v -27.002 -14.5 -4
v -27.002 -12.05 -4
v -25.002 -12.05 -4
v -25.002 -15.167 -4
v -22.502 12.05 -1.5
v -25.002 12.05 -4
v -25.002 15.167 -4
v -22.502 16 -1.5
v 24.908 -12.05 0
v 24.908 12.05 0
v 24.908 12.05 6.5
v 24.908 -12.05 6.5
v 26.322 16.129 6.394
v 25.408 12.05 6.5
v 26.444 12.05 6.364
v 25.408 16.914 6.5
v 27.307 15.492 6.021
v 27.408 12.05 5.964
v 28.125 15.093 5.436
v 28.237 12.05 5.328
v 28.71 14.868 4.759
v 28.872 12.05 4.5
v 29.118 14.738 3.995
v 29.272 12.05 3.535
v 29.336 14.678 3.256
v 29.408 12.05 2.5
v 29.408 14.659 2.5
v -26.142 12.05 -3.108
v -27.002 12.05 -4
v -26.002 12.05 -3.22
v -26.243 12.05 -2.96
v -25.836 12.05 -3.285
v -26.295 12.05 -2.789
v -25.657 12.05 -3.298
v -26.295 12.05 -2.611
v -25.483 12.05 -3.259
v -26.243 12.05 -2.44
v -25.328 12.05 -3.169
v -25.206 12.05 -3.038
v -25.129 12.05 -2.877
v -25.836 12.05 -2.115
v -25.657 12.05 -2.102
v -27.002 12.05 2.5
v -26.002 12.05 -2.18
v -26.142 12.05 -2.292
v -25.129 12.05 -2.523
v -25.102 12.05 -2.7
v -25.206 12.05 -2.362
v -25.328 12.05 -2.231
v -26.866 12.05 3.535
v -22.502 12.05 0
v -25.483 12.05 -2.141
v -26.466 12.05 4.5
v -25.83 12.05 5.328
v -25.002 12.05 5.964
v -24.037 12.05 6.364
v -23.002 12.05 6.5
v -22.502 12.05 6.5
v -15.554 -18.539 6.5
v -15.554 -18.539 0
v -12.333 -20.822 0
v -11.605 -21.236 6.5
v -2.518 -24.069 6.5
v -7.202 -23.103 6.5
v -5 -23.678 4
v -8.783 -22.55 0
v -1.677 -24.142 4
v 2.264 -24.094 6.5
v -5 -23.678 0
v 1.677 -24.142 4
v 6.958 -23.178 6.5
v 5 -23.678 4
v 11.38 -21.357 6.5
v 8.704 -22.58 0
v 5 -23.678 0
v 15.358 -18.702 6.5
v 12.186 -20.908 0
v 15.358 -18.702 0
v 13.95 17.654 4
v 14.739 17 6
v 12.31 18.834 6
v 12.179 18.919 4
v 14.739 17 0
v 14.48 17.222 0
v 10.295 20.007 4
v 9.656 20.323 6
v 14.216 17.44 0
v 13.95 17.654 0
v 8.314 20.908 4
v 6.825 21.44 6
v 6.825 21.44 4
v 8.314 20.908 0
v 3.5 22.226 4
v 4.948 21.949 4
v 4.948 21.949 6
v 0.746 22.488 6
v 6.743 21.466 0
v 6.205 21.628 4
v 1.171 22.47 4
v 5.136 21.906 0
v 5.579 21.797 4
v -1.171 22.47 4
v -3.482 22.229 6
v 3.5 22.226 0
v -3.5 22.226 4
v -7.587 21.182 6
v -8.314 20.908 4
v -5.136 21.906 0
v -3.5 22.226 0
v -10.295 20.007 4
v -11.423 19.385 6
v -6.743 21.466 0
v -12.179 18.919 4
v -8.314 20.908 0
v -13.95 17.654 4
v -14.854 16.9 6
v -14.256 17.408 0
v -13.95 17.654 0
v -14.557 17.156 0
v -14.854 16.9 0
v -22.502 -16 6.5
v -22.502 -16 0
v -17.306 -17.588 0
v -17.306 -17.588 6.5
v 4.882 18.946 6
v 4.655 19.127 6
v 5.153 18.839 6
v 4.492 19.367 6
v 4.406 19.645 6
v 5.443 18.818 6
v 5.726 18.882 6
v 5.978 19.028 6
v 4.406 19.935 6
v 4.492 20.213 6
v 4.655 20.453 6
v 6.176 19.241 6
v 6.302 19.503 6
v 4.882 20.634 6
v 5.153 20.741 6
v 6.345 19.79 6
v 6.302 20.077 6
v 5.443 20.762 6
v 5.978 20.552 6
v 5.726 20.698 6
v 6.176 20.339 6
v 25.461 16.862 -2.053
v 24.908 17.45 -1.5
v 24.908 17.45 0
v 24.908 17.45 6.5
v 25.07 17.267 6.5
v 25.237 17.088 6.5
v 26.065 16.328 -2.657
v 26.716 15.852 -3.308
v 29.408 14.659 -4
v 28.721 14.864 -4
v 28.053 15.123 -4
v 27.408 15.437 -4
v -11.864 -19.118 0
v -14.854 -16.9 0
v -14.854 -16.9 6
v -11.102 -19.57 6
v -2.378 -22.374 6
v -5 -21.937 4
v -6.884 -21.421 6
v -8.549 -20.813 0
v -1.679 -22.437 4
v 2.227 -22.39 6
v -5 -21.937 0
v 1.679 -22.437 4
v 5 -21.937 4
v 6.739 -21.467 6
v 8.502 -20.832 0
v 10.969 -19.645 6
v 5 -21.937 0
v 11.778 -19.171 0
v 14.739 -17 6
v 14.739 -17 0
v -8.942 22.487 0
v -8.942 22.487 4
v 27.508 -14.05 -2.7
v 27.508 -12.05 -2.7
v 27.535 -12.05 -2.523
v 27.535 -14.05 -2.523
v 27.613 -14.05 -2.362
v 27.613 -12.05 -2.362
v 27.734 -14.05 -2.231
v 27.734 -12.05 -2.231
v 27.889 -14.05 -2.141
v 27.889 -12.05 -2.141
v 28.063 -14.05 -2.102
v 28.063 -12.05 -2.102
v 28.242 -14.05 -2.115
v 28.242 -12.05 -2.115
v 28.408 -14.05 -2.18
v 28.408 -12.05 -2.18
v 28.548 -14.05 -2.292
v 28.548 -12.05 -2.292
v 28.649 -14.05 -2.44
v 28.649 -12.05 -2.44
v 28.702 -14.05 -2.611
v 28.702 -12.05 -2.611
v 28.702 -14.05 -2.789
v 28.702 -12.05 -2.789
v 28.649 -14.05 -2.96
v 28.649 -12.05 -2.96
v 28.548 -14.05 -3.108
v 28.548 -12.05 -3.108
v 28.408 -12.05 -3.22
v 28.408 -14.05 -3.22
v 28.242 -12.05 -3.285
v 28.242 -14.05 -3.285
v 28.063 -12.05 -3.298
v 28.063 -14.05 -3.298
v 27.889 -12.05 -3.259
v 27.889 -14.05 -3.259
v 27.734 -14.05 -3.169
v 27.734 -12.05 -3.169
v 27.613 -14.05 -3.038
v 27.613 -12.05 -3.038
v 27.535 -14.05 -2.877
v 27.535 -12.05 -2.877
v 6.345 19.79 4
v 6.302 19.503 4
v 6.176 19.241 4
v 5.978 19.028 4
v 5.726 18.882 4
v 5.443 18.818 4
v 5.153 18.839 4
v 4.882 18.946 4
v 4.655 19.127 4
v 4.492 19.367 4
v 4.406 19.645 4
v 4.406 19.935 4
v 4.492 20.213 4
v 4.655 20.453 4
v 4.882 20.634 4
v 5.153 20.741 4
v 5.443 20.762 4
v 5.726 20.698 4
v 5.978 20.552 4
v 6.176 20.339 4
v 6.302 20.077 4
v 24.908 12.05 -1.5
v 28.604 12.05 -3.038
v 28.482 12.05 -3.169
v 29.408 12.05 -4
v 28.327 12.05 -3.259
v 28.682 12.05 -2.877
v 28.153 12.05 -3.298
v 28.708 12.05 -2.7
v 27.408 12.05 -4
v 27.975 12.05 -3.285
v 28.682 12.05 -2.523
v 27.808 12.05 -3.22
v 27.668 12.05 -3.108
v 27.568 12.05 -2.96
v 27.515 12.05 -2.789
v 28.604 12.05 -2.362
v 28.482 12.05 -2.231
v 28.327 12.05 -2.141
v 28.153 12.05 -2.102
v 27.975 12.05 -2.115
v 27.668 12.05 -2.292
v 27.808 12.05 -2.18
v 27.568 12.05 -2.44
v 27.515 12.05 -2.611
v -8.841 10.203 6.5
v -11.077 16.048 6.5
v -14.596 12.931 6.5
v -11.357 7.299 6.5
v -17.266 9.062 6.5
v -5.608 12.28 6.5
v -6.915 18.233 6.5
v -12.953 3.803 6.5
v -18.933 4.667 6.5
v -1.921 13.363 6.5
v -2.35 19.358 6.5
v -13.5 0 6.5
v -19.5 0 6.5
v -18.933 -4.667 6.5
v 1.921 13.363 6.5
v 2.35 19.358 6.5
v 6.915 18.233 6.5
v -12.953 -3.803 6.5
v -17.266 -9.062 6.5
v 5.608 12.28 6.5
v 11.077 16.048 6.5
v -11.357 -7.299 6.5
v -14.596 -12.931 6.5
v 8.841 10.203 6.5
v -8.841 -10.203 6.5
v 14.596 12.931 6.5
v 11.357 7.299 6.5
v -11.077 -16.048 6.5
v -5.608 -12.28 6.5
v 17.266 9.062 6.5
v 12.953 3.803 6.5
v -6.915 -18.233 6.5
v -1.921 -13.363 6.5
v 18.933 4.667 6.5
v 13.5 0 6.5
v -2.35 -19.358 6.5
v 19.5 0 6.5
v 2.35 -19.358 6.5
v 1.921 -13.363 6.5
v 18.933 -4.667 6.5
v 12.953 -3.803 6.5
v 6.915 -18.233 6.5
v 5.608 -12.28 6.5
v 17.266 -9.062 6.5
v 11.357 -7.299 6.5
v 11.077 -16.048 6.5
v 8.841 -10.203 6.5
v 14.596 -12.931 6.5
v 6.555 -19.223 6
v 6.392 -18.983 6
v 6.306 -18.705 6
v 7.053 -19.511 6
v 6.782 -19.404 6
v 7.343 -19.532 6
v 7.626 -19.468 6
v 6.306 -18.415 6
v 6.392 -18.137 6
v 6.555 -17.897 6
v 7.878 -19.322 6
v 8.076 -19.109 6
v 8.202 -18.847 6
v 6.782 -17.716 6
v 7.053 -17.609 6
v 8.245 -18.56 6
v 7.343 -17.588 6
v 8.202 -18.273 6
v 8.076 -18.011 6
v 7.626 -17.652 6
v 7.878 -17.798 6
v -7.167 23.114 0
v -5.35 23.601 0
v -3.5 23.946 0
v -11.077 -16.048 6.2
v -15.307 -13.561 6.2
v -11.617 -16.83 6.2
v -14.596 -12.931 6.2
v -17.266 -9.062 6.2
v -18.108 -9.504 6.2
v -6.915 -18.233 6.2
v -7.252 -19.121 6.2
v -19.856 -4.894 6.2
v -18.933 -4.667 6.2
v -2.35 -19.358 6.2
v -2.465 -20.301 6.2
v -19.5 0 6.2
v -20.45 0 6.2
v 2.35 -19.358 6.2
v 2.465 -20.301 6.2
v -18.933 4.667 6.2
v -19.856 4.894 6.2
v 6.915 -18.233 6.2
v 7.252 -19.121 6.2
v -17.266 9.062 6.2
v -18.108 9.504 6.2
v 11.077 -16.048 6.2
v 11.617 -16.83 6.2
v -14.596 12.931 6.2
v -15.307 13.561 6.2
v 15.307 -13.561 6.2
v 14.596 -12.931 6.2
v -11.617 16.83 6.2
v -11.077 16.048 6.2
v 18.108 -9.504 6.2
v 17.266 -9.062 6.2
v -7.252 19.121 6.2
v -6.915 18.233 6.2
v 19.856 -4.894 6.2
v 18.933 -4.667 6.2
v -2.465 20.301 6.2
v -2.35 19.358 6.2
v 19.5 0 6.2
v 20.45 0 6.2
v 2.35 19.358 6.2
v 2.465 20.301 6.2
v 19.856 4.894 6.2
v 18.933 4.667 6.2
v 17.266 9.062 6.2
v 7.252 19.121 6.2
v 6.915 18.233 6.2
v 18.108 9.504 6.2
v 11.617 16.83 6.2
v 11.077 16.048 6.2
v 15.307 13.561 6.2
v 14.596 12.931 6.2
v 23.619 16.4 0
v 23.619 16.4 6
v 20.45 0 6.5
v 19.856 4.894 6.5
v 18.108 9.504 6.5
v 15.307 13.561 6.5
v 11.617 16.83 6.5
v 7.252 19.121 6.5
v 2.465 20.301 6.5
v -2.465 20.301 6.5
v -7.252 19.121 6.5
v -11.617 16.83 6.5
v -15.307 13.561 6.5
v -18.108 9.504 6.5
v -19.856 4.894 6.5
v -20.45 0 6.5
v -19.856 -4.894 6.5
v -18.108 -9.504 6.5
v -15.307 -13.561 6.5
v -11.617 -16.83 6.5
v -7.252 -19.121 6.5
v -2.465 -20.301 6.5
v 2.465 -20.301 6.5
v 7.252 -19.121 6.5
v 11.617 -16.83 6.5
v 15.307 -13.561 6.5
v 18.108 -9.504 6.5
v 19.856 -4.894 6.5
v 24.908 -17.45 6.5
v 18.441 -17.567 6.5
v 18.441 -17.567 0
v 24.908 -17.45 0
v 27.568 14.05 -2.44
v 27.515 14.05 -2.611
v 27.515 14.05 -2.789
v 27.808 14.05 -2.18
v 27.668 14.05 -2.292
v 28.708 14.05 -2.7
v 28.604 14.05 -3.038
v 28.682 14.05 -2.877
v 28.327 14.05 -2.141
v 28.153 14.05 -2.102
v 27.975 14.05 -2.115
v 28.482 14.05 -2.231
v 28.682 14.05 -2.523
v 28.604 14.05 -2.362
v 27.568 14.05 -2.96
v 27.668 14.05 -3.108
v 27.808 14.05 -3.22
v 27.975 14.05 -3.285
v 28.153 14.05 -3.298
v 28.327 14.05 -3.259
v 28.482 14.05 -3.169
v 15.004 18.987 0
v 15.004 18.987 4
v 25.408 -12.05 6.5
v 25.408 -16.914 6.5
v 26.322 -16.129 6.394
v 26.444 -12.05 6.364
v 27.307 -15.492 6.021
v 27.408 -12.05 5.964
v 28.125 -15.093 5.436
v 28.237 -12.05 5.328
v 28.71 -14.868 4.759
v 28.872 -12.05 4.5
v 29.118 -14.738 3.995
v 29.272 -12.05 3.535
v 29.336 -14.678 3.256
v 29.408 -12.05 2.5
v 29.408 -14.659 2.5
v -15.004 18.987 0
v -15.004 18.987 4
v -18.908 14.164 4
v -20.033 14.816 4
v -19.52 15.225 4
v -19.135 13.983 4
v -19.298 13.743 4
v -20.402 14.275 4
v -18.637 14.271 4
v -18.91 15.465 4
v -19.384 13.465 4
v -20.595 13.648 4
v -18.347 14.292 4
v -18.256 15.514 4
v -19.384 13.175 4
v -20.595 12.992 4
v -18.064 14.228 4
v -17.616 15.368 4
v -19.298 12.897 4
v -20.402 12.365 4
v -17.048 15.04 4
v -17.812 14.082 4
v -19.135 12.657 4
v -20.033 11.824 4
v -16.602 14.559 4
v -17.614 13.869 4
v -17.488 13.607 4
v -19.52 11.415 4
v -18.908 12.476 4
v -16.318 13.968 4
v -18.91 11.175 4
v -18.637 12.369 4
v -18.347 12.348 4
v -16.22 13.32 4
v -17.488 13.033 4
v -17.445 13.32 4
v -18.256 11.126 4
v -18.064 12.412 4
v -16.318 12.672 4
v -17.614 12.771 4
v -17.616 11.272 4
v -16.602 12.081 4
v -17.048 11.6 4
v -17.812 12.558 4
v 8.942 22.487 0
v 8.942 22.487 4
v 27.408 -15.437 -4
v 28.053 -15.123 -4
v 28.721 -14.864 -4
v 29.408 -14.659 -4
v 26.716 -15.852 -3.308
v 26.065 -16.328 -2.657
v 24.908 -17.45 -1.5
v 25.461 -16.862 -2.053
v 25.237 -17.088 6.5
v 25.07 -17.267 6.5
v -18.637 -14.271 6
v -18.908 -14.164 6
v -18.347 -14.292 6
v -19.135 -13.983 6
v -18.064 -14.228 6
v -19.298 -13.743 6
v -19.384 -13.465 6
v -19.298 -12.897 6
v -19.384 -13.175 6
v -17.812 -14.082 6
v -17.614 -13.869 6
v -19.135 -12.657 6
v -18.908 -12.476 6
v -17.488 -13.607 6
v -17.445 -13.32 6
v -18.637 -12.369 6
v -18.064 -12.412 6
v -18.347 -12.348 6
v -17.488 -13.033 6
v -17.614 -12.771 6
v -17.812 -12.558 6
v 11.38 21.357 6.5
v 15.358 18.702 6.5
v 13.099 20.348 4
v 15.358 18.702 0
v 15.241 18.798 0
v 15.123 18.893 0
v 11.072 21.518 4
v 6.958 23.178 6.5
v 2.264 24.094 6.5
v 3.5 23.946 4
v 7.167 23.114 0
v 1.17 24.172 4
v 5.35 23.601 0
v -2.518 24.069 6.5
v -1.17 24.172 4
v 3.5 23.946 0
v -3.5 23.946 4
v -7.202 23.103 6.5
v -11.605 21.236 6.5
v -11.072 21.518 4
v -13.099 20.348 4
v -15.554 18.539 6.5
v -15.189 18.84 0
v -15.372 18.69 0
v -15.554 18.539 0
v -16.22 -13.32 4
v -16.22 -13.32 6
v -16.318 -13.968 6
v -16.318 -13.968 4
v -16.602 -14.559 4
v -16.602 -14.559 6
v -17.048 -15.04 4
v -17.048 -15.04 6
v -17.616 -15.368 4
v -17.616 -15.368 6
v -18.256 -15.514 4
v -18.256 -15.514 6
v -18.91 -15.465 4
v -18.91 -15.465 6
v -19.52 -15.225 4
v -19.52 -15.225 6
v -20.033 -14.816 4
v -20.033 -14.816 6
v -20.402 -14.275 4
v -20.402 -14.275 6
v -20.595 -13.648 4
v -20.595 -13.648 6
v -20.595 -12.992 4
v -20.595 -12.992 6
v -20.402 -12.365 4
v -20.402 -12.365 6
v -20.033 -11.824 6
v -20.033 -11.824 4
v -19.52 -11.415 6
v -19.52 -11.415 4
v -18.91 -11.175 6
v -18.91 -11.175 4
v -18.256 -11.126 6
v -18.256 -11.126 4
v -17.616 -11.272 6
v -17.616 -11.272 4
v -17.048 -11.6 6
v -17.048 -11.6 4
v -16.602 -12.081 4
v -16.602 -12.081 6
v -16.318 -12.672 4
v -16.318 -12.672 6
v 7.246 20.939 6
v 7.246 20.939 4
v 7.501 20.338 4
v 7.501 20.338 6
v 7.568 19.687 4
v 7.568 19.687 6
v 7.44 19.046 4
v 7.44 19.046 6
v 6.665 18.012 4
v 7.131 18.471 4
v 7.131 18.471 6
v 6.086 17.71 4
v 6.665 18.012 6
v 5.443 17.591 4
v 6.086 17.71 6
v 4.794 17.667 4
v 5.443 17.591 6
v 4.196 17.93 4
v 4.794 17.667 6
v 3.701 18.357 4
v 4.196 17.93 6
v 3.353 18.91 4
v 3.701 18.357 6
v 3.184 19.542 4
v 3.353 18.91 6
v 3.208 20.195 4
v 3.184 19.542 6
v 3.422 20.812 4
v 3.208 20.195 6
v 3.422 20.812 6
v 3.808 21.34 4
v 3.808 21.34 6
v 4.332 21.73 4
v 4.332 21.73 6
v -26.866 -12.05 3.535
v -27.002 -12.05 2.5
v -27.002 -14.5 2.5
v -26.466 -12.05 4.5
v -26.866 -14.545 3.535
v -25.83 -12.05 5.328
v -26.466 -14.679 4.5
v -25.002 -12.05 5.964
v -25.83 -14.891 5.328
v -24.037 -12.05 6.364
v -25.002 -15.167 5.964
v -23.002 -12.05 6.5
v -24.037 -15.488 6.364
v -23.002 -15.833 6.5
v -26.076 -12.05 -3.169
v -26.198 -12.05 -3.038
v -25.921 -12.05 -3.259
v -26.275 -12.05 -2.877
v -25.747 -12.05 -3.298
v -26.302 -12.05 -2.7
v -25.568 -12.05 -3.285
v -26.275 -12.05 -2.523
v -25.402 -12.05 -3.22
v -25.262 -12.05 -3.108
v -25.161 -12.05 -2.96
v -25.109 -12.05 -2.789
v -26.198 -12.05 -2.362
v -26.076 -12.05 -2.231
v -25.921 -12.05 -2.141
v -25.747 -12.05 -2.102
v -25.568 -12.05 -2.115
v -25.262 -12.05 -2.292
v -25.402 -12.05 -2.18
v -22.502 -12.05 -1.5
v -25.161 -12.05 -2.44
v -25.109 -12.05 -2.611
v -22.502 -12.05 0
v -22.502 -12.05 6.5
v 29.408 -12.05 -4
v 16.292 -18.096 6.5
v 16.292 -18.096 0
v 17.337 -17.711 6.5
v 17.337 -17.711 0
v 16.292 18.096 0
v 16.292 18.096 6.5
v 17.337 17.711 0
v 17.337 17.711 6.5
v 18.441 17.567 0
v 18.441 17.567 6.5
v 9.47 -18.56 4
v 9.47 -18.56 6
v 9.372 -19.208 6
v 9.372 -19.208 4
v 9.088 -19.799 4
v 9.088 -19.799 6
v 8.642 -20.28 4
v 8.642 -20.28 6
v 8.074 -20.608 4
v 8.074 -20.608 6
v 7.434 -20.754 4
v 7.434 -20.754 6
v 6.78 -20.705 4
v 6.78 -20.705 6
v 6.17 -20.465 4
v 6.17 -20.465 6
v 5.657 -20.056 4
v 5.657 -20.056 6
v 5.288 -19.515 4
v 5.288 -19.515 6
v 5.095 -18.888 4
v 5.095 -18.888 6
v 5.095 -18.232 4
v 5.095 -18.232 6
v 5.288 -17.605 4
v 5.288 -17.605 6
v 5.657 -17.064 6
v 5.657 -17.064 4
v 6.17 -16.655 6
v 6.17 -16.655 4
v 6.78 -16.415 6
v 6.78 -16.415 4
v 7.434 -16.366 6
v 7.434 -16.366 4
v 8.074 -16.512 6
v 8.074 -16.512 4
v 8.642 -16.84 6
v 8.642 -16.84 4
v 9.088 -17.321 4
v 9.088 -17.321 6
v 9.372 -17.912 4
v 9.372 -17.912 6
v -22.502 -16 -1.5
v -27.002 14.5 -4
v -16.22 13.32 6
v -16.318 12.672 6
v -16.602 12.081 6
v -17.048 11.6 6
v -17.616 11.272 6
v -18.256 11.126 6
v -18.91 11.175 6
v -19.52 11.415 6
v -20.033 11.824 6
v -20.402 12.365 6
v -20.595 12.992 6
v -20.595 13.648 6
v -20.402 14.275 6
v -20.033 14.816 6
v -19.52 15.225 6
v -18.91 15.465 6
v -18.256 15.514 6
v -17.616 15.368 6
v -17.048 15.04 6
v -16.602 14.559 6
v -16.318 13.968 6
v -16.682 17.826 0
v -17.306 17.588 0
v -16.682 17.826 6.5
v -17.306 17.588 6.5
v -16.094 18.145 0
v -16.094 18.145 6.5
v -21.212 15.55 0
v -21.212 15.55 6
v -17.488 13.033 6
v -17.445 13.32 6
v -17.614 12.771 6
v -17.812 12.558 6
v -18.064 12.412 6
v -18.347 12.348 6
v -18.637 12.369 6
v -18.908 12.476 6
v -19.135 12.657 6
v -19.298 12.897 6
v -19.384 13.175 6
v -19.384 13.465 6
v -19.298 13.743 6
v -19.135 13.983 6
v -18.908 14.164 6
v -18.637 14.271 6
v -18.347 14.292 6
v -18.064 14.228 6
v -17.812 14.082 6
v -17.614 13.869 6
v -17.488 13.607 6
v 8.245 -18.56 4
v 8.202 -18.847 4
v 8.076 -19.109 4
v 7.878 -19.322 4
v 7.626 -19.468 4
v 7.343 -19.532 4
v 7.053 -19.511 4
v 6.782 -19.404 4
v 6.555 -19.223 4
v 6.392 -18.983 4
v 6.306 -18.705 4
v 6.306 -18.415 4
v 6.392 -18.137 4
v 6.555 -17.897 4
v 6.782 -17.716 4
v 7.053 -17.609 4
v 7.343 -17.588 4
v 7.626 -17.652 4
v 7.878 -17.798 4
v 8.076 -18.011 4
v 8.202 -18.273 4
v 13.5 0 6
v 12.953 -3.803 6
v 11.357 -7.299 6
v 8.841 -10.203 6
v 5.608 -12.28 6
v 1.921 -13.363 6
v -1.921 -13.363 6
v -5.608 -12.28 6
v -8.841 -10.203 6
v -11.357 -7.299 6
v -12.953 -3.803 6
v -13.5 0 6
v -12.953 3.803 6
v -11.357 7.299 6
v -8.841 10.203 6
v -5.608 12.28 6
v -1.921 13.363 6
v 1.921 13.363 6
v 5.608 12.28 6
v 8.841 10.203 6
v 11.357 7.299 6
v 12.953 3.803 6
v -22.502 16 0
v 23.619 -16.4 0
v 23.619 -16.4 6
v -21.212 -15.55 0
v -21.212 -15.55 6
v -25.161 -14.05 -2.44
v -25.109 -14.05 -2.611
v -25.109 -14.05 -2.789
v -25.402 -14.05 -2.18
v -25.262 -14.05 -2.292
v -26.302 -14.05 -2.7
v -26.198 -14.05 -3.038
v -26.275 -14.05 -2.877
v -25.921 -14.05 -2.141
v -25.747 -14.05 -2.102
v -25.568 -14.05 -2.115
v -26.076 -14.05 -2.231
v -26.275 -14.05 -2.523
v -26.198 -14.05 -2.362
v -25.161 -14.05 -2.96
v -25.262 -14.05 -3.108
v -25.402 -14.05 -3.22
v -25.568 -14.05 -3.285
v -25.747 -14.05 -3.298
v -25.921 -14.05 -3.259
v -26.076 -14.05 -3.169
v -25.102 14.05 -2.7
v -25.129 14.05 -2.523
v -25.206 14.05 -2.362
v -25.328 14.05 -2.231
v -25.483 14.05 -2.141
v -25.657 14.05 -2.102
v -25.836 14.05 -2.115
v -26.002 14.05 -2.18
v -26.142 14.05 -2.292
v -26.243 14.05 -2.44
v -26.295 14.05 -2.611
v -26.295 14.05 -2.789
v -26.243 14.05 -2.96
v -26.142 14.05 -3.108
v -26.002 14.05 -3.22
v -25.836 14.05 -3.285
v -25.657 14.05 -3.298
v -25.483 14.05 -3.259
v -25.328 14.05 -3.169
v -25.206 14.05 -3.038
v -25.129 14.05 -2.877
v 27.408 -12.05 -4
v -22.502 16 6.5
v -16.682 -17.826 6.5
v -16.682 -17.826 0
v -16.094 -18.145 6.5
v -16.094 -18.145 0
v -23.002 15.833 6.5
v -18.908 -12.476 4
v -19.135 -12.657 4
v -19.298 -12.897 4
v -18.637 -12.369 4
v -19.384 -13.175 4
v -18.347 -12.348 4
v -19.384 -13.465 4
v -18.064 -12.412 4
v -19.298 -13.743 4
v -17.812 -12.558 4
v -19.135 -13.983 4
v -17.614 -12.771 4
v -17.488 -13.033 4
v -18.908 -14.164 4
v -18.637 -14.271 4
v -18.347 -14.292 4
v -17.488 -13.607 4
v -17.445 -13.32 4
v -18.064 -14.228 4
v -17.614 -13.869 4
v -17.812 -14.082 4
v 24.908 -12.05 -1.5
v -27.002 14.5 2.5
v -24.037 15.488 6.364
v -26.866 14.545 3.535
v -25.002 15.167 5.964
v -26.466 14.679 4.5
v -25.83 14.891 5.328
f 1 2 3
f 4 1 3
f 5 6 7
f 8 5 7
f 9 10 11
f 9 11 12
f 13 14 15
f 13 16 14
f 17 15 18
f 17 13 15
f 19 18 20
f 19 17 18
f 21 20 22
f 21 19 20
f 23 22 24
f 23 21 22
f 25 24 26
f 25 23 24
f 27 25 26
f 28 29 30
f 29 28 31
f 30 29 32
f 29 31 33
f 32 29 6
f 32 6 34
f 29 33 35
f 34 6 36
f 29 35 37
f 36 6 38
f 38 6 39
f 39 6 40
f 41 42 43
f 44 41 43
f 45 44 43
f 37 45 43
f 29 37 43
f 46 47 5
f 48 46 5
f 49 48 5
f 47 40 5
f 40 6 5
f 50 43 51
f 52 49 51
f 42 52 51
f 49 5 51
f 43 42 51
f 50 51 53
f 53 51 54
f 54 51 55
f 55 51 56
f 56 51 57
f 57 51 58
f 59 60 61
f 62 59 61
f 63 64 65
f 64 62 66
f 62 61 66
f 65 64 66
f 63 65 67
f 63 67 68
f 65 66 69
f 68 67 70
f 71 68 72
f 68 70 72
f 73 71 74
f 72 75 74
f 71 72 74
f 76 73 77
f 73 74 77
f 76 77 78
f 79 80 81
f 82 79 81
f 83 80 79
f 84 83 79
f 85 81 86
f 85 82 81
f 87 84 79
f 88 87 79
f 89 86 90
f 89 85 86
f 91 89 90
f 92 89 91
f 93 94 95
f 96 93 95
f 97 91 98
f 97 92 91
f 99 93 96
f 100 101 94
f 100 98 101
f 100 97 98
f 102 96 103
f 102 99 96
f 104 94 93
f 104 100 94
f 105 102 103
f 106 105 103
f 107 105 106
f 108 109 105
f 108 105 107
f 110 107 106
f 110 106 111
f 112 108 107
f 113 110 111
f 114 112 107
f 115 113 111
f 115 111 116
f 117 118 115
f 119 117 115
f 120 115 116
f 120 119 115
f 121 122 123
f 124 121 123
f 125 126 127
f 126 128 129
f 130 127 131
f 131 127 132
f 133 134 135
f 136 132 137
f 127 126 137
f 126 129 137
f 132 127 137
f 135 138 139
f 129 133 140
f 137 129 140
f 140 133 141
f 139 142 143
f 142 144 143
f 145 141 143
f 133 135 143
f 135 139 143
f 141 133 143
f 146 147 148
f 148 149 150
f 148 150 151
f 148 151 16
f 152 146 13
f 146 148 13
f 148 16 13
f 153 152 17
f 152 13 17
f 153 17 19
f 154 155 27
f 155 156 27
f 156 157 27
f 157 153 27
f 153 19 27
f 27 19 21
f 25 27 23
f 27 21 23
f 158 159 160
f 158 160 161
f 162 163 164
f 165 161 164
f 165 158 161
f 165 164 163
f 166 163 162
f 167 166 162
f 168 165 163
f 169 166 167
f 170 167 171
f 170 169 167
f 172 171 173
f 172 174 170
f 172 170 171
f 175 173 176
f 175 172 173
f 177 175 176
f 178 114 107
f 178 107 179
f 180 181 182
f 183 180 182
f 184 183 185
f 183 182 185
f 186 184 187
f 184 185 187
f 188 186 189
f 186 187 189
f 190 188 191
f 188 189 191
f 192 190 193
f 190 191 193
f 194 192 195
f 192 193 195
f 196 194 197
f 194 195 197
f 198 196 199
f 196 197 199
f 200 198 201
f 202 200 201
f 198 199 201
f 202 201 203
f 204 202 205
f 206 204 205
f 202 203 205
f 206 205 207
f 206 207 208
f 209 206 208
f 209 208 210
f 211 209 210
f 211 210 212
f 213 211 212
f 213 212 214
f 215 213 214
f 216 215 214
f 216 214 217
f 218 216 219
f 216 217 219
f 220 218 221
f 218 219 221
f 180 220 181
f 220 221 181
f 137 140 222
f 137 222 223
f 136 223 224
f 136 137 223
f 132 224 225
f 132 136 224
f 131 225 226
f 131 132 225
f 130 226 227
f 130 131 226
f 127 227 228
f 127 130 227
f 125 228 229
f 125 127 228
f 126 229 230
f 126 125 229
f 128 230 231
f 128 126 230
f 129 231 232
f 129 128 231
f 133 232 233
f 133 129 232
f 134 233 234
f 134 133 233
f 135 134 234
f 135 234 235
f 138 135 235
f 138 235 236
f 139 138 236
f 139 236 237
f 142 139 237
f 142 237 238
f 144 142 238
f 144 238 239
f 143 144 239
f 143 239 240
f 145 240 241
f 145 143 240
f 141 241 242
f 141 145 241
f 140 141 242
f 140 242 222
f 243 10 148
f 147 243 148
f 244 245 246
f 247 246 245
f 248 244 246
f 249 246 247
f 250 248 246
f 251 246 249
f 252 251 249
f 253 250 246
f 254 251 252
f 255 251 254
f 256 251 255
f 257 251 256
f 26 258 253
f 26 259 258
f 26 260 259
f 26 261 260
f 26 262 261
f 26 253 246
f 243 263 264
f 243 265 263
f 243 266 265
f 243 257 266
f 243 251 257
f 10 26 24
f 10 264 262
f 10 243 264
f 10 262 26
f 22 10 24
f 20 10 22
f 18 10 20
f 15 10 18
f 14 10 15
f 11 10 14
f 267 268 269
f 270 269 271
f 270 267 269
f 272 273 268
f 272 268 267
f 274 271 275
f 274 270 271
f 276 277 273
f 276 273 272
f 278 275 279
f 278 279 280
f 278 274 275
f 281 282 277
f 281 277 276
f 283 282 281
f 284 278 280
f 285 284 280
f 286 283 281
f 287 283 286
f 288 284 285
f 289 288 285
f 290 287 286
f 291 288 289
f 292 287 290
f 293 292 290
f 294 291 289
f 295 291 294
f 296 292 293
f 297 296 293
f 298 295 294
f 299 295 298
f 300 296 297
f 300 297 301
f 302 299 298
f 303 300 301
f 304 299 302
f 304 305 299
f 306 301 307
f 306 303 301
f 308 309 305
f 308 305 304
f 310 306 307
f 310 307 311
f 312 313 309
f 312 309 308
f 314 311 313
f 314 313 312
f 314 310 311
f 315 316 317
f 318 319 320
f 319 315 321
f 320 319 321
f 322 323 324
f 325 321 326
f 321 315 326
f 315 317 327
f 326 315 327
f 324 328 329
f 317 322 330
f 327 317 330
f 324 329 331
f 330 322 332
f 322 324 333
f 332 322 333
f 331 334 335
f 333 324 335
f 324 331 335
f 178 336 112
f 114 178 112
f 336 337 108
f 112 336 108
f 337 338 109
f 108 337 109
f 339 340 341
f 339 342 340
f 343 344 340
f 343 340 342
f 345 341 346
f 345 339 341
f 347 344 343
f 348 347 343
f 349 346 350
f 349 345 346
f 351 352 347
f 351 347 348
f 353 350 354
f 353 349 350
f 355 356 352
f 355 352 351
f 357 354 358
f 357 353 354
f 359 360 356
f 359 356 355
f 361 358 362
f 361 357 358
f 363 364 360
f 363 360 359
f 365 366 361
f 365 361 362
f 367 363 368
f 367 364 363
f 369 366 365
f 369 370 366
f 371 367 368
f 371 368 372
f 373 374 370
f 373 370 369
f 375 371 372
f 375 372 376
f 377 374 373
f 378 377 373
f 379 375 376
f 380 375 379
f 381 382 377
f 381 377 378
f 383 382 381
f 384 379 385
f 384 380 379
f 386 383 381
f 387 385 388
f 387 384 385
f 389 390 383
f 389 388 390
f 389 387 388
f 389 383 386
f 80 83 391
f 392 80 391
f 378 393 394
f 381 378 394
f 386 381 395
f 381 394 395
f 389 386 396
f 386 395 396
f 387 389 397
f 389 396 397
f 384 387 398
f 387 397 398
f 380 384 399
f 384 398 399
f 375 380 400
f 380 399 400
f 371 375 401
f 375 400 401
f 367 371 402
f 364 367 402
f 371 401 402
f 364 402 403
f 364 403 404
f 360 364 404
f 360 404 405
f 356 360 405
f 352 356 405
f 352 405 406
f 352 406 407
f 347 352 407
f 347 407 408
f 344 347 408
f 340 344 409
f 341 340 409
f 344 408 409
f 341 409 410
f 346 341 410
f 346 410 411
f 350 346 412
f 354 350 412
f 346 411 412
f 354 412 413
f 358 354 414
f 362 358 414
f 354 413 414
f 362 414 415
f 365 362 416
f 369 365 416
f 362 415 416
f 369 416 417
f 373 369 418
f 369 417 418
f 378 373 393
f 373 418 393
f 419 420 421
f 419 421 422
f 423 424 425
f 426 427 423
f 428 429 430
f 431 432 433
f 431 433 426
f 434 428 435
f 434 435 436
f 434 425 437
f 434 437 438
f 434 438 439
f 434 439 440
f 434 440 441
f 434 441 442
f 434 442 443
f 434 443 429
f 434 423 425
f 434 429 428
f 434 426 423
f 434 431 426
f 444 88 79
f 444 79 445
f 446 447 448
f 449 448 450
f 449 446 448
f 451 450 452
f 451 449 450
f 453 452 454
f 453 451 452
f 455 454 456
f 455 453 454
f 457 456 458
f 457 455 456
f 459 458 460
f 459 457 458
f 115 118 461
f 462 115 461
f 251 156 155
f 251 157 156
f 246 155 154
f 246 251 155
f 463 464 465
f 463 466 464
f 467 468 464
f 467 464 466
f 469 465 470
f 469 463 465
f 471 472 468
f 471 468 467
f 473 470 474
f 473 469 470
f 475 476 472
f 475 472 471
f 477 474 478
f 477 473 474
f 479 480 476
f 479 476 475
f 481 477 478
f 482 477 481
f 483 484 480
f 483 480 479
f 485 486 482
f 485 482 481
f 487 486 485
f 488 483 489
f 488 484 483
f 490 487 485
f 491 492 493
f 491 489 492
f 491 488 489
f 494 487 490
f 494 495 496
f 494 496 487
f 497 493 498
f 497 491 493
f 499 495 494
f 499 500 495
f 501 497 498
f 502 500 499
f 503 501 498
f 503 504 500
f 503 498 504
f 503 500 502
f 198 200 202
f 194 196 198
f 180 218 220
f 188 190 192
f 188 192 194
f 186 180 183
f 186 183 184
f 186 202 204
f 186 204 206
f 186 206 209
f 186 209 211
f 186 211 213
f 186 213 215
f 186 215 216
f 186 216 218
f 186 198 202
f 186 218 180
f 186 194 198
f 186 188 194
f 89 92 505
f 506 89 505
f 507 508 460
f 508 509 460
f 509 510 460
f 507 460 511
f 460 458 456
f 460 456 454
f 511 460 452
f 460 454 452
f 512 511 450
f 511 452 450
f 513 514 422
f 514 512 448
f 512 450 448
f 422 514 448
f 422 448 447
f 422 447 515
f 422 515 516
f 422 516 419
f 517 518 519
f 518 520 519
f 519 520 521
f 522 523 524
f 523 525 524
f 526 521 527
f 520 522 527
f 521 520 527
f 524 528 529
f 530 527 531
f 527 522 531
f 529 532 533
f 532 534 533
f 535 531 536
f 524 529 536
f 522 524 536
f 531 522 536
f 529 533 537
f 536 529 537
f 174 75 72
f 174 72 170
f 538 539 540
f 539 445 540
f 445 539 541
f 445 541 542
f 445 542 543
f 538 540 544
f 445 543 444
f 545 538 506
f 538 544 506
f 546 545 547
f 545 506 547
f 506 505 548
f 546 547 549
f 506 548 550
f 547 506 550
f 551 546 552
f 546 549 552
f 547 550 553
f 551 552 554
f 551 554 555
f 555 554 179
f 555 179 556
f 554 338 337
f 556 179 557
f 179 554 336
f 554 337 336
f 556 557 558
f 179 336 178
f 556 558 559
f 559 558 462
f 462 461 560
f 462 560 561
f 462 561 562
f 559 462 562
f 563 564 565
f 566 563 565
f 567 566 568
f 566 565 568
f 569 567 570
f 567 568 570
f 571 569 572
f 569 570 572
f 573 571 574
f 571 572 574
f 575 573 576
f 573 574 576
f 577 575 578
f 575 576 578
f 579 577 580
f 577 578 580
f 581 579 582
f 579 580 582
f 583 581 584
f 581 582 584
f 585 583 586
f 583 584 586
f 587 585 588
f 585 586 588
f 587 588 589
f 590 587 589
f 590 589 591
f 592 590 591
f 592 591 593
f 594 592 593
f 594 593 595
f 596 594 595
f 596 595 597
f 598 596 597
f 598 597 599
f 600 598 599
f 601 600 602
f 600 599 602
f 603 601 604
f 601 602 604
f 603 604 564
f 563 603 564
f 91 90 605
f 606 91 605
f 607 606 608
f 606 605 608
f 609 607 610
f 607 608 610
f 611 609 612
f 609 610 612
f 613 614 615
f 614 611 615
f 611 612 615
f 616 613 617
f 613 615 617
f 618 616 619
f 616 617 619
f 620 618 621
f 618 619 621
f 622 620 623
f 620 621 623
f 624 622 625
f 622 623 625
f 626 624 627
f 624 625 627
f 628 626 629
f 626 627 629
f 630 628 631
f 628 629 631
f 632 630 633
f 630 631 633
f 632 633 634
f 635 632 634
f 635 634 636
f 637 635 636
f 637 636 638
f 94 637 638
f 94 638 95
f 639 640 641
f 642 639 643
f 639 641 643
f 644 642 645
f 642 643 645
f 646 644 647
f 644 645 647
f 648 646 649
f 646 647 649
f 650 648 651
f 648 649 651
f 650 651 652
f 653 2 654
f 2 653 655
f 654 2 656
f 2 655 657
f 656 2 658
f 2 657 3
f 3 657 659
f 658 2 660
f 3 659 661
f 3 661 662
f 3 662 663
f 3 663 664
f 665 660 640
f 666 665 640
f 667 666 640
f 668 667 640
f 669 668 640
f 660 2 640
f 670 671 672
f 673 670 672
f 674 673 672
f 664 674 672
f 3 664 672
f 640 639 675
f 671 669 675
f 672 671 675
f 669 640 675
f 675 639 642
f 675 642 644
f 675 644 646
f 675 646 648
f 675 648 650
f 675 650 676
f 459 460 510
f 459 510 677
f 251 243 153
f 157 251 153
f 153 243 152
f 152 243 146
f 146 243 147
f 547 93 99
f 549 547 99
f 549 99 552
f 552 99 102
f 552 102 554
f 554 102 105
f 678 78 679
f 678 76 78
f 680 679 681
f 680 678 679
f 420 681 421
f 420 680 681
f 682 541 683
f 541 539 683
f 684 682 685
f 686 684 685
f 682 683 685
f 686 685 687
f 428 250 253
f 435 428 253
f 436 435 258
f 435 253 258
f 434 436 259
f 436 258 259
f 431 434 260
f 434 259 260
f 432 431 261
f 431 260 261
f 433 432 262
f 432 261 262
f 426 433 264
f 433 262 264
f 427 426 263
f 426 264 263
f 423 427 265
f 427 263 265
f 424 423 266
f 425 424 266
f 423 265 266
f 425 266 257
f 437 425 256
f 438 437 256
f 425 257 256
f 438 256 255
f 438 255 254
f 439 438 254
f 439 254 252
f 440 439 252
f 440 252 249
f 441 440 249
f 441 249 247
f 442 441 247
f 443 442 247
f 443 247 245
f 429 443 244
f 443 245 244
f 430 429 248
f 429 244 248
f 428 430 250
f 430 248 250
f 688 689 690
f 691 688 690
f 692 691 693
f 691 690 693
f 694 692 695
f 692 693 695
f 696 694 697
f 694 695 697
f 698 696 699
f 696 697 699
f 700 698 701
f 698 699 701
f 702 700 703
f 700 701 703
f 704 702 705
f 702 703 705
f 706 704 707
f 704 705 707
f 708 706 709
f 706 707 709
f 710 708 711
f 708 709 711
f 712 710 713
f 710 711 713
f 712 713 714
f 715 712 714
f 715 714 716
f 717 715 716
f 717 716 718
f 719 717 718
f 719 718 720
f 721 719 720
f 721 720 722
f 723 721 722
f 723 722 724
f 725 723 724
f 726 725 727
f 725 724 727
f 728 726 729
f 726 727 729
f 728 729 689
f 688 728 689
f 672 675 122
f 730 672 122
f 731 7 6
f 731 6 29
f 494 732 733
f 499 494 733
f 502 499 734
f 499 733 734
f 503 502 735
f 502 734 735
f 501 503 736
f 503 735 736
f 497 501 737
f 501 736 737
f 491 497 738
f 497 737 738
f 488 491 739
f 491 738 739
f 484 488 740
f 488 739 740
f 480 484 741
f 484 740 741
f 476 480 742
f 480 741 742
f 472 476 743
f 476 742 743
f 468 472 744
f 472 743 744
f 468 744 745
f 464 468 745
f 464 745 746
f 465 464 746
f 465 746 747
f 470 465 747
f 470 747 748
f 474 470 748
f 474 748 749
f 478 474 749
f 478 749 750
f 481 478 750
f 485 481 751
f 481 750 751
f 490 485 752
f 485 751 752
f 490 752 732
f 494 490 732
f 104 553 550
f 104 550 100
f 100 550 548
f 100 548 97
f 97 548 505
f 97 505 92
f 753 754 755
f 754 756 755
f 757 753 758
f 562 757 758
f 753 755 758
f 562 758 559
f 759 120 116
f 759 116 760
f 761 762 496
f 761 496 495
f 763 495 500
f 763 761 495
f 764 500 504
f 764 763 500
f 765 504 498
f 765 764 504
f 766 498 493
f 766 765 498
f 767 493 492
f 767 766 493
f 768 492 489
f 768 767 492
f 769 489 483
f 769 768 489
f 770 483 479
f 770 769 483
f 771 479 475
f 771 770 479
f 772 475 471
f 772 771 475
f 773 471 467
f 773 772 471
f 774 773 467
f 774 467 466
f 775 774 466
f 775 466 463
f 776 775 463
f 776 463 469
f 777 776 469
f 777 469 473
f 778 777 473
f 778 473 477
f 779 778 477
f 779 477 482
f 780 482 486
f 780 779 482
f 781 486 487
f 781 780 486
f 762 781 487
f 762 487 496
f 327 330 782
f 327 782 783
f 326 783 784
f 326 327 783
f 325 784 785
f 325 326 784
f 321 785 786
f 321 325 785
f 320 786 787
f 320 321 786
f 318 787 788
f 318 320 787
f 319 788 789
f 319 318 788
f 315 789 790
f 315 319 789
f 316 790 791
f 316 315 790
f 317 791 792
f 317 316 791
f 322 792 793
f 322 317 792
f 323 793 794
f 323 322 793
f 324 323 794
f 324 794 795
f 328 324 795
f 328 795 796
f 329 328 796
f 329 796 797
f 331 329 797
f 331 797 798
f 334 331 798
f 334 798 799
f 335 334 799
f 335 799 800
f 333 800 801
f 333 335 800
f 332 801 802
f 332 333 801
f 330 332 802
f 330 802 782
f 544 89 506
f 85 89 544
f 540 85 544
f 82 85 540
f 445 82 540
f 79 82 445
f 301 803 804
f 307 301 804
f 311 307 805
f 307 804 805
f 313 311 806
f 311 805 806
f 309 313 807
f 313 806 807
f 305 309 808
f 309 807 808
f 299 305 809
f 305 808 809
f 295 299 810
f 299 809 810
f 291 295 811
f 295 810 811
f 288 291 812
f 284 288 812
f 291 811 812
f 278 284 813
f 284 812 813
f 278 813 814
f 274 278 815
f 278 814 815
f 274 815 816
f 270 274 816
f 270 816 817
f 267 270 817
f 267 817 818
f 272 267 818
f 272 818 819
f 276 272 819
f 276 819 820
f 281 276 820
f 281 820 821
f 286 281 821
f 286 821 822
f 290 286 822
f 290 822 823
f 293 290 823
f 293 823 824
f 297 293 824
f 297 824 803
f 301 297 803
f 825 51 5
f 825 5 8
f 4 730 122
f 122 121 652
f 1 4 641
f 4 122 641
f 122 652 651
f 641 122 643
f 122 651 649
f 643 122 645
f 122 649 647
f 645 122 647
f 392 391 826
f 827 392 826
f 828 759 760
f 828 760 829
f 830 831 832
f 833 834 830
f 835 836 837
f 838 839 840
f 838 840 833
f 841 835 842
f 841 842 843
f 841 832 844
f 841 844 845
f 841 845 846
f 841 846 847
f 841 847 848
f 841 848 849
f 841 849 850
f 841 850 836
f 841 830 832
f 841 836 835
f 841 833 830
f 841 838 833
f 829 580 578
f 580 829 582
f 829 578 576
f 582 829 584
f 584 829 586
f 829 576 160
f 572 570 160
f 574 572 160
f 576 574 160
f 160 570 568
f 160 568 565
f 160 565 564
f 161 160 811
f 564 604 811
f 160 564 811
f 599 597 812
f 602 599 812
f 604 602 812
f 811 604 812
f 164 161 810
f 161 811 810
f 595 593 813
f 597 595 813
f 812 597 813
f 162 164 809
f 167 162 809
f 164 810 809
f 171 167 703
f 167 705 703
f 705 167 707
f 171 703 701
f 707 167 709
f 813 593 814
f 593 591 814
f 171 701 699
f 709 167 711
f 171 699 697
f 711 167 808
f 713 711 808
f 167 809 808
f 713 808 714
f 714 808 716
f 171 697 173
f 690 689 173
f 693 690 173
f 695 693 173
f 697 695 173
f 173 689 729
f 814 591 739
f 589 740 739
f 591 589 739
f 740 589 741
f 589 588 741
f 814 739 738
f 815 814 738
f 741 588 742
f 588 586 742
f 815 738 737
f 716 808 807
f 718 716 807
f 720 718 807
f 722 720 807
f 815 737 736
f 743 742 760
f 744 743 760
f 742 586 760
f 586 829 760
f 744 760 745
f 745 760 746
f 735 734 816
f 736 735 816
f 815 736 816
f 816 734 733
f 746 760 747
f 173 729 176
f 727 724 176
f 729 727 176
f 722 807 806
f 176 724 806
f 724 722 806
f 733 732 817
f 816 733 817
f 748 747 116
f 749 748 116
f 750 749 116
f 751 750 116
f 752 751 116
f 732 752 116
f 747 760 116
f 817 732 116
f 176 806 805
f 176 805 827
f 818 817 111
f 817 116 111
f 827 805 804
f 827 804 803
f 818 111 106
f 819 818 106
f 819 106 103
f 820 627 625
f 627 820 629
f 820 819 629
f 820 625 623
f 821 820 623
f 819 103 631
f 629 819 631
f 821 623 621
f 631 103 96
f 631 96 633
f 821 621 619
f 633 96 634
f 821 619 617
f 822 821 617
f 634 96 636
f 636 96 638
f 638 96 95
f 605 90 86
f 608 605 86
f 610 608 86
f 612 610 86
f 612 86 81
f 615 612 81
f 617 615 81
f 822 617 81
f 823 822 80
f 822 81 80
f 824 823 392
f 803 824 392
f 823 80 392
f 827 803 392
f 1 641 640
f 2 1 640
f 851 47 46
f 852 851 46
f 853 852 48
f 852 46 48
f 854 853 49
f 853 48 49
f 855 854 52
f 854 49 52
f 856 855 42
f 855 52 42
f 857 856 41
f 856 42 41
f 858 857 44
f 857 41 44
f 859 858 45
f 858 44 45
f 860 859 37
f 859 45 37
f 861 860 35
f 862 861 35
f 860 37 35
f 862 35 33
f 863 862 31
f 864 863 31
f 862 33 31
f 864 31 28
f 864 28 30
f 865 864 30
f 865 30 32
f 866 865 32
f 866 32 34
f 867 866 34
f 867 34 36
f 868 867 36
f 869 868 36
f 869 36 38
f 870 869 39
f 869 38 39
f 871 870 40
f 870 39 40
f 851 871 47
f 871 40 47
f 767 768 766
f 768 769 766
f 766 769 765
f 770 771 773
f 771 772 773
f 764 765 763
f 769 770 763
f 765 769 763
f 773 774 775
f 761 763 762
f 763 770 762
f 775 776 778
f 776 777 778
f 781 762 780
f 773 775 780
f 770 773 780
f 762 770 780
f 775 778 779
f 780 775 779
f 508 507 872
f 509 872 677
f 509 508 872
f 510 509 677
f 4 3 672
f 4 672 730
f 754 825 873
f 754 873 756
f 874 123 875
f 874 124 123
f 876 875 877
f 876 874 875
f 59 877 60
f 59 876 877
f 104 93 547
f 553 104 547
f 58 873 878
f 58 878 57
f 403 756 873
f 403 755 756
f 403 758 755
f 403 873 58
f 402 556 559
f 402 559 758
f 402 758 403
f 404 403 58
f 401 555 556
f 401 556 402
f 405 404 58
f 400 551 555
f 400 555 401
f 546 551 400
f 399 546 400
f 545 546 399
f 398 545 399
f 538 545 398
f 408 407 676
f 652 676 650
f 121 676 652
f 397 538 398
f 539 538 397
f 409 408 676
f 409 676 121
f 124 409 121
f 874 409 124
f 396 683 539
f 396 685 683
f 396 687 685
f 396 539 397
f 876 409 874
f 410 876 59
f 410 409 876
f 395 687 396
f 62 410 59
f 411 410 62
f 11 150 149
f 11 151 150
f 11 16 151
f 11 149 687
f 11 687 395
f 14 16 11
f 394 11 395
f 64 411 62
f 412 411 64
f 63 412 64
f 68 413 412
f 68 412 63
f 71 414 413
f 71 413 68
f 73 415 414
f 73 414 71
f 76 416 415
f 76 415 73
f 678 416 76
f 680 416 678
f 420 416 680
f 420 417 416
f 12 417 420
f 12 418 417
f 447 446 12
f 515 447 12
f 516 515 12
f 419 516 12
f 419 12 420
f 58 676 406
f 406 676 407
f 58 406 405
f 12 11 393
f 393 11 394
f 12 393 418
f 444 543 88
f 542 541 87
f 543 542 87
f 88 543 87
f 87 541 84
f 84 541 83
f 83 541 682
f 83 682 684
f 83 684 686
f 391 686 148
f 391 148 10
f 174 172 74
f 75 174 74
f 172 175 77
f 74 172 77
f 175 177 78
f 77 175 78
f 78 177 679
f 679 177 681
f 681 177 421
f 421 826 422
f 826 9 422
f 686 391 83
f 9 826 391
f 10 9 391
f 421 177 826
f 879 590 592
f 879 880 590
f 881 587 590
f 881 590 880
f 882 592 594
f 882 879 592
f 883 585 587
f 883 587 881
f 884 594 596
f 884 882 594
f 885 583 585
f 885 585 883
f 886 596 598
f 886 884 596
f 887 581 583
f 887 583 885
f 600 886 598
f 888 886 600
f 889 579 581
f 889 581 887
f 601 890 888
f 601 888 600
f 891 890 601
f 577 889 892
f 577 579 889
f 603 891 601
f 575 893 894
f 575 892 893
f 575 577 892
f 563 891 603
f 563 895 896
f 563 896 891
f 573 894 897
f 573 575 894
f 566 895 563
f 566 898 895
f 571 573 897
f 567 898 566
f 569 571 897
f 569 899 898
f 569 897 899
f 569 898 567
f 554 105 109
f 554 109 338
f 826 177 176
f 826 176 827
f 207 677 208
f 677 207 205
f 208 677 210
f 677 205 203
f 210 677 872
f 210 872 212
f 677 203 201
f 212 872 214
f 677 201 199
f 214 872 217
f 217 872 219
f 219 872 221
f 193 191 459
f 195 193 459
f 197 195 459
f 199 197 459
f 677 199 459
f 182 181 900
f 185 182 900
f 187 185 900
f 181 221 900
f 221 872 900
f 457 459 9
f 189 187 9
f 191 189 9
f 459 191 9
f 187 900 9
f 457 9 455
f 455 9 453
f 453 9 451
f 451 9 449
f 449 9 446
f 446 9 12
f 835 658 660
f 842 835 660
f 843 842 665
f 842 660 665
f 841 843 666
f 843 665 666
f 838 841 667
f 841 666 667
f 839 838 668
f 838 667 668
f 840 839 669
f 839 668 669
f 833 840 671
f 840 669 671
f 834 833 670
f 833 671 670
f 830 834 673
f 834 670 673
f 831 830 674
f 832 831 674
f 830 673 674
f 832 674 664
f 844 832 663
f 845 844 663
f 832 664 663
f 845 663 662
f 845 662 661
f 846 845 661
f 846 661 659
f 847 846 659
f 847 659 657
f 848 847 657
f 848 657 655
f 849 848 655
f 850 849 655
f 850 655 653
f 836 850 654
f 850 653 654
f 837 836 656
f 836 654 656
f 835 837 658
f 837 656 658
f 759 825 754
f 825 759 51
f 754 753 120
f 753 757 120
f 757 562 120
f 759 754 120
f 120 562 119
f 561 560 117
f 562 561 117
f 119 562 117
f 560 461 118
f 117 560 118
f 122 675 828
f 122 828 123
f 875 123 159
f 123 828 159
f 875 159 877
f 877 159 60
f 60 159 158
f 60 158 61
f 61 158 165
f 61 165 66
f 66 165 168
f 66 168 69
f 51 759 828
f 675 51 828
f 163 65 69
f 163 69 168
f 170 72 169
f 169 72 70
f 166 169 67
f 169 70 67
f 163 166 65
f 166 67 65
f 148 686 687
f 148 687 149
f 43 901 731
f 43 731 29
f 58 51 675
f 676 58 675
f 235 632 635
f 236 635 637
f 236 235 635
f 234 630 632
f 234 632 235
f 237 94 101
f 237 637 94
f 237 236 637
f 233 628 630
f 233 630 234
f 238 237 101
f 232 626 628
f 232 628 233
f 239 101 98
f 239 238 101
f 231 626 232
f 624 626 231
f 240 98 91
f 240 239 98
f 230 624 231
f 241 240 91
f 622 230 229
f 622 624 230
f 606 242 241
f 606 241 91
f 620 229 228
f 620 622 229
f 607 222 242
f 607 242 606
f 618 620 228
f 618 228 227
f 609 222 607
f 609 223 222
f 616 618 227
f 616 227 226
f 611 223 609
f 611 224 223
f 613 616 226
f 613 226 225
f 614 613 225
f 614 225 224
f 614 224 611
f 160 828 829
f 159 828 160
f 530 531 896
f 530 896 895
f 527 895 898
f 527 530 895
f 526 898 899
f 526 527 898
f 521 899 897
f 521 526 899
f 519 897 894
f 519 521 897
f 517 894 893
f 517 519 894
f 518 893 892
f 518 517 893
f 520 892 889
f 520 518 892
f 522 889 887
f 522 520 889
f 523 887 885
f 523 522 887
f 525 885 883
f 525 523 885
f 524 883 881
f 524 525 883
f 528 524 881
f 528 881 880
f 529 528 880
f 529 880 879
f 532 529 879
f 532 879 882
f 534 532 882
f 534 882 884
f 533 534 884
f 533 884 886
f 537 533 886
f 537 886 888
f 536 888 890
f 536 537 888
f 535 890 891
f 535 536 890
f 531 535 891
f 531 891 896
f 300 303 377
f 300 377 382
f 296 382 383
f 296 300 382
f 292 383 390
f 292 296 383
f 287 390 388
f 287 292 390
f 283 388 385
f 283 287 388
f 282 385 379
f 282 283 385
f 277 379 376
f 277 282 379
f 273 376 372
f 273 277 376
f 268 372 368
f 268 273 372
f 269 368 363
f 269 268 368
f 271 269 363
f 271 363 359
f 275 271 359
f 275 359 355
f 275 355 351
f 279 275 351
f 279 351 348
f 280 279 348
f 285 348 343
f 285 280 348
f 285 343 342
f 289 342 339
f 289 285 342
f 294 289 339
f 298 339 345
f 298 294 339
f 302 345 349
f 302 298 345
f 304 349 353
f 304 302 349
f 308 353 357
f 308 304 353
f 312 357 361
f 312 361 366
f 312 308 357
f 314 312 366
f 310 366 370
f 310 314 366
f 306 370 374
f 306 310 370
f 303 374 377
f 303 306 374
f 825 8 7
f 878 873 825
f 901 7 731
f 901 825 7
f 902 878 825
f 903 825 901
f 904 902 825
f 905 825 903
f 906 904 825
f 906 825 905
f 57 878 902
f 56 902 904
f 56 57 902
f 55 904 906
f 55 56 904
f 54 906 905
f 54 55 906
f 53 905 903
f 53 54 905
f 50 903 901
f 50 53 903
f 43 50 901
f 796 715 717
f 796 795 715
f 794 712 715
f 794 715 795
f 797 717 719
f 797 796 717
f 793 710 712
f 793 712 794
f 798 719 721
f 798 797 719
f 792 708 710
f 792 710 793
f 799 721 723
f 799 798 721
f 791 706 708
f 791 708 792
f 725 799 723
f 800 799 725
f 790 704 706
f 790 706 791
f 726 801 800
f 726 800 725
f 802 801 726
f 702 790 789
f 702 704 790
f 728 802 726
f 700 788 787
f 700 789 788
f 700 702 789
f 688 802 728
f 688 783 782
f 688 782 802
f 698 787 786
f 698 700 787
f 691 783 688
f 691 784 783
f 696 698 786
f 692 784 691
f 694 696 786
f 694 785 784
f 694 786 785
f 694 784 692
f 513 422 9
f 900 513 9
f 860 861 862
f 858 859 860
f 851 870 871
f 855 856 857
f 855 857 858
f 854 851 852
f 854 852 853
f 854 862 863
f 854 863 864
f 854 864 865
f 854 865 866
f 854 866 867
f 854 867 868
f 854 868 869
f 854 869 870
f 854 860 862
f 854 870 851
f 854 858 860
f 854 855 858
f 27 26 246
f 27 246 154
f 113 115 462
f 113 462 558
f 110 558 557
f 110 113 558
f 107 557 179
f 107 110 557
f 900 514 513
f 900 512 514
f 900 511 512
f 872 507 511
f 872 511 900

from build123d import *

# Parameters (mm, degrees)
PAD_DEPTH       = 6.5
POCKET_DEPTH    = 6
SKETCH002_R     = 13.5
POCKET001_DEPTH = 1
SKETCH003_W     = 5.4
SKETCH003_H     = 6.5
PAD001_DEPTH    = 4.5
POCKET002_DEPTH = 10
SKETCH010_W     = 3.95
SKETCH010_H     = 6.5
PAD002_DEPTH    = 4.5
POCKET005_DEPTH = 10
SKETCH014_R     = 20.45
SKETCH014_R_2   = 19.5
POCKET008_DEPTH = 0.3
SKETCH015_R     = 2.2
SKETCH015_R_2   = 0.975
PAD003_DEPTH    = 2
POCKET009_DEPTH = 4
POCKET010_DEPTH = 4
PAD004_DEPTH    = 4
SKETCH019_R     = 0.6
POCKET011_DEPTH = 2
SKETCH020_R     = 0.6
POCKET012_DEPTH = 2
FILLET_R        = 4
CHAMFER_SIZE    = 2.5
FILLET001_R     = 5


with BuildPart() as part:
    # Sketch → Pad (new body)
    with BuildSketch(Plane.XY):
        with BuildLine():
            Line((-22.5019915649, 16), (-22.5019915649, -16))
            Line((-22.5019915649, -16), (-16.2858834577, -17.9000000001))
            ThreePointArc((-16.2858834577, -17.9000000001), (0.2206895737, -24.1989937004), (16.6096357576, -17.5999999999))
            Line((16.6096357576, -17.5999999999), (24.9082802252, -17.45))
            Line((24.9082802252, 17.45), (24.9082802252, -17.45))
            Line((16.6096357576, 17.6), (24.9082802252, 17.45))
            ThreePointArc((16.6096357576, 17.6), (0.2206895736, 24.1989937004), (-16.2858834578, 17.9))
            Line((-22.5019915649, 16), (-16.2858834578, 17.9))
        make_face()
    extrude(amount=PAD_DEPTH)

    # Sketch001 → Pocket (cut)
    with BuildSketch(Plane.XY):
        with BuildLine():
            Line((-14.8539557021, 16.9), (-21.2122180433, 15.55))
            Line((-21.2122180433, 15.55), (-21.2122180433, -15.55))
            Line((-21.2122180433, -15.55), (-14.8539557021, -16.9))
            ThreePointArc((-14.8539557021, -16.9), (-0.0760301383, -22.4998715423), (14.739402973, -17))
            Line((14.739402973, -17), (23.6191552218, -16.4))
            Line((23.6191552218, 16.4), (23.6191552218, -16.4))
            Line((14.739402973, 17), (23.6191552218, 16.4))
            ThreePointArc((14.739402973, 17), (-0.0760301383, 22.4998715423), (-14.8539557021, 16.9))
        make_face()
    extrude(amount=POCKET_DEPTH, mode=Mode.SUBTRACT)

    # Sketch002 (on Face19 of Pocket) → Pocket001 (cut)
    with BuildSketch(Plane(origin=(0, 0, 6), x_dir=(1, 0, 0), z_dir=(0, 0, -1))):
        Circle(SKETCH002_R)
    extrude(amount=-POCKET001_DEPTH, mode=Mode.SUBTRACT)

    # Sketch003 (on Face7 of Pad) → Pad001 (join)
    with BuildSketch(Plane.YZ.offset(24.9082802252)):
        with Locations((-14.75, 3.25)):
            Rectangle(SKETCH003_W, SKETCH003_H)
        with Locations((14.75, 3.25)):
            Rectangle(SKETCH003_W, SKETCH003_H)
    extrude(amount=PAD001_DEPTH)

    # Sketch006 (on Face22 of Pad001) → Pocket002 (cut)
    with BuildSketch(Plane.XY.offset(6.5)):
        with BuildLine():
            ThreePointArc((24.9082802252, 17.45), (26.9423471239, 15.7065020586), (29.4082802252, 14.6594169811))
            Line((29.4082802252, 17.45), (29.4082802252, 14.6594169811))
            Line((29.4082802252, 17.45), (24.9082802252, 17.45))
        make_face()
        with BuildLine():
            ThreePointArc((29.4082802252, -14.6594169811), (26.9423471239, -15.7065020586), (24.9082802252, -17.45))
            Line((29.4082802252, -17.45), (24.9082802252, -17.45))
            Line((29.4082802252, -14.6594169811), (29.4082802252, -17.45))
        make_face()
    extrude(amount=-POCKET002_DEPTH, mode=Mode.SUBTRACT)

    # Sketch010 (on Face3 of Pad) → Pad002 (join)
    with BuildSketch(Plane(origin=(-22.5019915649, 0, 0), x_dir=(0, -1, 0), z_dir=(-1, 0, 0))):
        with Locations((-14.025, 3.25)):
            Rectangle(SKETCH010_W, SKETCH010_H)
        with Locations((14.025, 3.25)):
            Rectangle(SKETCH010_W, SKETCH010_H)
    extrude(amount=PAD002_DEPTH)

    # Sketch011 (on Face28 of Pad002) → Pocket005 (cut)
    with BuildSketch(Plane.XY.offset(6.5)):
        Polygon((-27.0019915649, 16), (-22.5019915649, 16), (-27.0019915649, 14.5), align=None)
        Polygon((-22.5019915649, -16), (-27.0019915649, -14.5), (-27.0019915649, -16), align=None)
    extrude(amount=-POCKET005_DEPTH, mode=Mode.SUBTRACT)

    # Sketch014 (on Face10 of Pad) → Pocket008 (cut)
    with BuildSketch(Plane.XY.offset(6.5)):
        Circle(SKETCH014_R)
        Circle(SKETCH014_R_2, mode=Mode.SUBTRACT)
    extrude(amount=-POCKET008_DEPTH, mode=Mode.SUBTRACT)

    # Sketch015 (on Face19 of Pocket) → Pad003 (join)
    with BuildSketch(Plane(origin=(0, 0, 6), x_dir=(1, 0, 0), z_dir=(0, 0, -1))):
        with Locations((-18.42, 13.32)):
            Circle(SKETCH015_R)
        with Locations((-18.42, 13.32)):
            Circle(SKETCH015_R_2, mode=Mode.SUBTRACT)
        with Locations((7.27, 18.56)):
            Circle(SKETCH015_R)
        with Locations((7.27, 18.56)):
            Circle(SKETCH015_R_2, mode=Mode.SUBTRACT)
        with Locations((5.37, -19.79)):
            Circle(SKETCH015_R)
        with Locations((5.37, -19.79)):
            Circle(SKETCH015_R_2, mode=Mode.SUBTRACT)
        with Locations((-18.42, -13.32)):
            Circle(SKETCH015_R)
        with Locations((-18.42, -13.32)):
            Circle(SKETCH015_R_2, mode=Mode.SUBTRACT)
    extrude(amount=PAD003_DEPTH)

    # Sketch016 → Pocket009 (cut)
    with BuildSketch(Plane(origin=(0, 0, 0), x_dir=(-1, 0, 0), z_dir=(0, 0, 1))):
        with BuildLine():
            Line((-5, 23.6778377391), (-5, 21.9374109685))
            ThreePointArc((5, 21.9374109685), (0, 22.5), (-5, 21.9374109685))
            Line((5, 23.6778377391), (5, 21.9374109685))
            ThreePointArc((5, 23.6778377391), (0, 24.2), (-5, 23.6778377391))
        make_face()
    extrude(amount=POCKET009_DEPTH, mode=Mode.SUBTRACT)

    # Sketch017 → Pocket010 (cut)
    with BuildSketch(Plane(origin=(0, 0, 0), x_dir=(-1, 0, 0), z_dir=(0, 0, 1))):
        with BuildLine():
            Line((-3.499984119, -22.2261132717), (-3.5, -23.9455632634))
            ThreePointArc((-3.5, -23.9455632634), (0, -24.2000019575), (3.5, -23.9455632634))
            Line((3.5000158811, -22.2261082701), (3.5, -23.9455632634))
            ThreePointArc((-3.499984119, -22.2261132717), (1.60767e-05, -22.5), (3.5000158811, -22.2261082701))
        make_face()
        with BuildLine():
            ThreePointArc((-13.9498796389, -17.6536358312), (-11.25, -19.4855715851), (-8.3135572795, -20.9077680626))
            Line((-8.3135572795, -20.9077680626), (-8.9416927184, -22.487466094))
            ThreePointArc((-15.0038705449, -18.987466094), (-12.1, -20.9578147716), (-8.9416927184, -22.487466094))
            Line((-13.9498796389, -17.6536358312), (-15.0038705449, -18.987466094))
        make_face()
        with BuildLine():
            ThreePointArc((8.3135572795, -20.9077680626), (11.25, -19.4855715851), (13.9498796389, -17.6536358312))
            Line((13.9498796389, -17.6536358312), (15.0038705449, -18.987466094))
            ThreePointArc((8.9416927184, -22.487466094), (12.1, -20.9578147716), (15.0038705449, -18.987466094))
            Line((8.3135572795, -20.9077680626), (8.9416927184, -22.487466094))
        make_face()
    extrude(amount=POCKET010_DEPTH, mode=Mode.SUBTRACT)

    # Sketch018 (on Face8 of Pocket005) → Pad004 (join)
    with BuildSketch(Plane(origin=(0, 0, 0), x_dir=(1, 0, 0), z_dir=(0, 0, -1))):
        Polygon((-27.0019915649, 14.5), (-27.0019915649, 12.05), (-22.5019915649, 12.05), (-22.5019915649, 16), align=None)
        Polygon((-27.0019915649, -12.05), (-22.5019915649, -12.05), (-22.5019915649, -16), (-27.0019915649, -14.5), align=None)
        with BuildLine():
            Line((24.9082802252, 17.45), (24.9082802252, 12.05))
            Line((29.4082802252, 12.05), (24.9082802252, 12.05))
            Line((29.4082802252, 14.6594169811), (29.4082802252, 12.05))
            ThreePointArc((24.9082802252, 17.45), (26.9423471239, 15.7065020586), (29.4082802252, 14.6594169811))
        make_face()
        with BuildLine():
            Line((24.9082802252, -12.05), (24.9082802252, -17.45))
            ThreePointArc((29.4082802252, -14.6594169811), (26.9423471239, -15.7065020586), (24.9082802252, -17.45))
            Line((29.4082802252, -12.05), (29.4082802252, -14.6594169811))
            Line((24.9082802252, -12.05), (29.4082802252, -12.05))
        make_face()
    extrude(amount=PAD004_DEPTH)

    # Sketch019 (on Face64 of Pad004) → Pocket011 (cut)
    with BuildSketch(Plane.XZ.offset(-12.05)):
        with Locations((28.1082802252, -2.7)):
            Circle(SKETCH019_R)
        with Locations((-25.7019915649, -2.7)):
            Circle(SKETCH019_R)
    extrude(amount=-POCKET011_DEPTH, mode=Mode.SUBTRACT)

    # Sketch020 (on Face50 of Pocket011) → Pocket012 (cut)
    with BuildSketch(Plane(origin=(0, -12.05, 0), x_dir=(-1, 0, 0), z_dir=(0, 1, 0))):
        with Locations((-28.1082802252, -2.7)):
            Circle(SKETCH020_R)
        with Locations((25.7019915649, -2.7)):
            Circle(SKETCH020_R)
    extrude(amount=-POCKET012_DEPTH, mode=Mode.SUBTRACT)

    # Fillet
    fillet_edges = [part.edges().sort_by_distance(p)[0] for p in [
        (29.40828, -13.354708, 6.5),
        (29.40828, 13.354708, 6.5),
        (-27.001992, -13.275, 6.5),
        (-27.001992, 13.275, 6.5),
    ]]
    fillet(fillet_edges, radius=FILLET_R)

    # Chamfer
    chamfer_edges = [part.edges().sort_by_distance(p)[0] for p in [
        (24.90828, -14.75, -4),
        (24.90828, 14.75, -4),
        (-22.501992, -14.025, -4),
        (-22.501992, 14.025, -4),
    ]]
    chamfer(chamfer_edges, length=CHAMFER_SIZE)

    # Fillet001
    fillet001_edges = [part.edges().sort_by_distance(p)[0] for p in [
        (16.609636, -17.6, 3.25),
        (-16.285883, -17.9, 3.25),
        (16.609636, 17.6, 3.25),
        (-16.285883, 17.9, 3.25),
    ]]
    fillet(fillet001_edges, radius=FILLET001_R)


solid = part.part
